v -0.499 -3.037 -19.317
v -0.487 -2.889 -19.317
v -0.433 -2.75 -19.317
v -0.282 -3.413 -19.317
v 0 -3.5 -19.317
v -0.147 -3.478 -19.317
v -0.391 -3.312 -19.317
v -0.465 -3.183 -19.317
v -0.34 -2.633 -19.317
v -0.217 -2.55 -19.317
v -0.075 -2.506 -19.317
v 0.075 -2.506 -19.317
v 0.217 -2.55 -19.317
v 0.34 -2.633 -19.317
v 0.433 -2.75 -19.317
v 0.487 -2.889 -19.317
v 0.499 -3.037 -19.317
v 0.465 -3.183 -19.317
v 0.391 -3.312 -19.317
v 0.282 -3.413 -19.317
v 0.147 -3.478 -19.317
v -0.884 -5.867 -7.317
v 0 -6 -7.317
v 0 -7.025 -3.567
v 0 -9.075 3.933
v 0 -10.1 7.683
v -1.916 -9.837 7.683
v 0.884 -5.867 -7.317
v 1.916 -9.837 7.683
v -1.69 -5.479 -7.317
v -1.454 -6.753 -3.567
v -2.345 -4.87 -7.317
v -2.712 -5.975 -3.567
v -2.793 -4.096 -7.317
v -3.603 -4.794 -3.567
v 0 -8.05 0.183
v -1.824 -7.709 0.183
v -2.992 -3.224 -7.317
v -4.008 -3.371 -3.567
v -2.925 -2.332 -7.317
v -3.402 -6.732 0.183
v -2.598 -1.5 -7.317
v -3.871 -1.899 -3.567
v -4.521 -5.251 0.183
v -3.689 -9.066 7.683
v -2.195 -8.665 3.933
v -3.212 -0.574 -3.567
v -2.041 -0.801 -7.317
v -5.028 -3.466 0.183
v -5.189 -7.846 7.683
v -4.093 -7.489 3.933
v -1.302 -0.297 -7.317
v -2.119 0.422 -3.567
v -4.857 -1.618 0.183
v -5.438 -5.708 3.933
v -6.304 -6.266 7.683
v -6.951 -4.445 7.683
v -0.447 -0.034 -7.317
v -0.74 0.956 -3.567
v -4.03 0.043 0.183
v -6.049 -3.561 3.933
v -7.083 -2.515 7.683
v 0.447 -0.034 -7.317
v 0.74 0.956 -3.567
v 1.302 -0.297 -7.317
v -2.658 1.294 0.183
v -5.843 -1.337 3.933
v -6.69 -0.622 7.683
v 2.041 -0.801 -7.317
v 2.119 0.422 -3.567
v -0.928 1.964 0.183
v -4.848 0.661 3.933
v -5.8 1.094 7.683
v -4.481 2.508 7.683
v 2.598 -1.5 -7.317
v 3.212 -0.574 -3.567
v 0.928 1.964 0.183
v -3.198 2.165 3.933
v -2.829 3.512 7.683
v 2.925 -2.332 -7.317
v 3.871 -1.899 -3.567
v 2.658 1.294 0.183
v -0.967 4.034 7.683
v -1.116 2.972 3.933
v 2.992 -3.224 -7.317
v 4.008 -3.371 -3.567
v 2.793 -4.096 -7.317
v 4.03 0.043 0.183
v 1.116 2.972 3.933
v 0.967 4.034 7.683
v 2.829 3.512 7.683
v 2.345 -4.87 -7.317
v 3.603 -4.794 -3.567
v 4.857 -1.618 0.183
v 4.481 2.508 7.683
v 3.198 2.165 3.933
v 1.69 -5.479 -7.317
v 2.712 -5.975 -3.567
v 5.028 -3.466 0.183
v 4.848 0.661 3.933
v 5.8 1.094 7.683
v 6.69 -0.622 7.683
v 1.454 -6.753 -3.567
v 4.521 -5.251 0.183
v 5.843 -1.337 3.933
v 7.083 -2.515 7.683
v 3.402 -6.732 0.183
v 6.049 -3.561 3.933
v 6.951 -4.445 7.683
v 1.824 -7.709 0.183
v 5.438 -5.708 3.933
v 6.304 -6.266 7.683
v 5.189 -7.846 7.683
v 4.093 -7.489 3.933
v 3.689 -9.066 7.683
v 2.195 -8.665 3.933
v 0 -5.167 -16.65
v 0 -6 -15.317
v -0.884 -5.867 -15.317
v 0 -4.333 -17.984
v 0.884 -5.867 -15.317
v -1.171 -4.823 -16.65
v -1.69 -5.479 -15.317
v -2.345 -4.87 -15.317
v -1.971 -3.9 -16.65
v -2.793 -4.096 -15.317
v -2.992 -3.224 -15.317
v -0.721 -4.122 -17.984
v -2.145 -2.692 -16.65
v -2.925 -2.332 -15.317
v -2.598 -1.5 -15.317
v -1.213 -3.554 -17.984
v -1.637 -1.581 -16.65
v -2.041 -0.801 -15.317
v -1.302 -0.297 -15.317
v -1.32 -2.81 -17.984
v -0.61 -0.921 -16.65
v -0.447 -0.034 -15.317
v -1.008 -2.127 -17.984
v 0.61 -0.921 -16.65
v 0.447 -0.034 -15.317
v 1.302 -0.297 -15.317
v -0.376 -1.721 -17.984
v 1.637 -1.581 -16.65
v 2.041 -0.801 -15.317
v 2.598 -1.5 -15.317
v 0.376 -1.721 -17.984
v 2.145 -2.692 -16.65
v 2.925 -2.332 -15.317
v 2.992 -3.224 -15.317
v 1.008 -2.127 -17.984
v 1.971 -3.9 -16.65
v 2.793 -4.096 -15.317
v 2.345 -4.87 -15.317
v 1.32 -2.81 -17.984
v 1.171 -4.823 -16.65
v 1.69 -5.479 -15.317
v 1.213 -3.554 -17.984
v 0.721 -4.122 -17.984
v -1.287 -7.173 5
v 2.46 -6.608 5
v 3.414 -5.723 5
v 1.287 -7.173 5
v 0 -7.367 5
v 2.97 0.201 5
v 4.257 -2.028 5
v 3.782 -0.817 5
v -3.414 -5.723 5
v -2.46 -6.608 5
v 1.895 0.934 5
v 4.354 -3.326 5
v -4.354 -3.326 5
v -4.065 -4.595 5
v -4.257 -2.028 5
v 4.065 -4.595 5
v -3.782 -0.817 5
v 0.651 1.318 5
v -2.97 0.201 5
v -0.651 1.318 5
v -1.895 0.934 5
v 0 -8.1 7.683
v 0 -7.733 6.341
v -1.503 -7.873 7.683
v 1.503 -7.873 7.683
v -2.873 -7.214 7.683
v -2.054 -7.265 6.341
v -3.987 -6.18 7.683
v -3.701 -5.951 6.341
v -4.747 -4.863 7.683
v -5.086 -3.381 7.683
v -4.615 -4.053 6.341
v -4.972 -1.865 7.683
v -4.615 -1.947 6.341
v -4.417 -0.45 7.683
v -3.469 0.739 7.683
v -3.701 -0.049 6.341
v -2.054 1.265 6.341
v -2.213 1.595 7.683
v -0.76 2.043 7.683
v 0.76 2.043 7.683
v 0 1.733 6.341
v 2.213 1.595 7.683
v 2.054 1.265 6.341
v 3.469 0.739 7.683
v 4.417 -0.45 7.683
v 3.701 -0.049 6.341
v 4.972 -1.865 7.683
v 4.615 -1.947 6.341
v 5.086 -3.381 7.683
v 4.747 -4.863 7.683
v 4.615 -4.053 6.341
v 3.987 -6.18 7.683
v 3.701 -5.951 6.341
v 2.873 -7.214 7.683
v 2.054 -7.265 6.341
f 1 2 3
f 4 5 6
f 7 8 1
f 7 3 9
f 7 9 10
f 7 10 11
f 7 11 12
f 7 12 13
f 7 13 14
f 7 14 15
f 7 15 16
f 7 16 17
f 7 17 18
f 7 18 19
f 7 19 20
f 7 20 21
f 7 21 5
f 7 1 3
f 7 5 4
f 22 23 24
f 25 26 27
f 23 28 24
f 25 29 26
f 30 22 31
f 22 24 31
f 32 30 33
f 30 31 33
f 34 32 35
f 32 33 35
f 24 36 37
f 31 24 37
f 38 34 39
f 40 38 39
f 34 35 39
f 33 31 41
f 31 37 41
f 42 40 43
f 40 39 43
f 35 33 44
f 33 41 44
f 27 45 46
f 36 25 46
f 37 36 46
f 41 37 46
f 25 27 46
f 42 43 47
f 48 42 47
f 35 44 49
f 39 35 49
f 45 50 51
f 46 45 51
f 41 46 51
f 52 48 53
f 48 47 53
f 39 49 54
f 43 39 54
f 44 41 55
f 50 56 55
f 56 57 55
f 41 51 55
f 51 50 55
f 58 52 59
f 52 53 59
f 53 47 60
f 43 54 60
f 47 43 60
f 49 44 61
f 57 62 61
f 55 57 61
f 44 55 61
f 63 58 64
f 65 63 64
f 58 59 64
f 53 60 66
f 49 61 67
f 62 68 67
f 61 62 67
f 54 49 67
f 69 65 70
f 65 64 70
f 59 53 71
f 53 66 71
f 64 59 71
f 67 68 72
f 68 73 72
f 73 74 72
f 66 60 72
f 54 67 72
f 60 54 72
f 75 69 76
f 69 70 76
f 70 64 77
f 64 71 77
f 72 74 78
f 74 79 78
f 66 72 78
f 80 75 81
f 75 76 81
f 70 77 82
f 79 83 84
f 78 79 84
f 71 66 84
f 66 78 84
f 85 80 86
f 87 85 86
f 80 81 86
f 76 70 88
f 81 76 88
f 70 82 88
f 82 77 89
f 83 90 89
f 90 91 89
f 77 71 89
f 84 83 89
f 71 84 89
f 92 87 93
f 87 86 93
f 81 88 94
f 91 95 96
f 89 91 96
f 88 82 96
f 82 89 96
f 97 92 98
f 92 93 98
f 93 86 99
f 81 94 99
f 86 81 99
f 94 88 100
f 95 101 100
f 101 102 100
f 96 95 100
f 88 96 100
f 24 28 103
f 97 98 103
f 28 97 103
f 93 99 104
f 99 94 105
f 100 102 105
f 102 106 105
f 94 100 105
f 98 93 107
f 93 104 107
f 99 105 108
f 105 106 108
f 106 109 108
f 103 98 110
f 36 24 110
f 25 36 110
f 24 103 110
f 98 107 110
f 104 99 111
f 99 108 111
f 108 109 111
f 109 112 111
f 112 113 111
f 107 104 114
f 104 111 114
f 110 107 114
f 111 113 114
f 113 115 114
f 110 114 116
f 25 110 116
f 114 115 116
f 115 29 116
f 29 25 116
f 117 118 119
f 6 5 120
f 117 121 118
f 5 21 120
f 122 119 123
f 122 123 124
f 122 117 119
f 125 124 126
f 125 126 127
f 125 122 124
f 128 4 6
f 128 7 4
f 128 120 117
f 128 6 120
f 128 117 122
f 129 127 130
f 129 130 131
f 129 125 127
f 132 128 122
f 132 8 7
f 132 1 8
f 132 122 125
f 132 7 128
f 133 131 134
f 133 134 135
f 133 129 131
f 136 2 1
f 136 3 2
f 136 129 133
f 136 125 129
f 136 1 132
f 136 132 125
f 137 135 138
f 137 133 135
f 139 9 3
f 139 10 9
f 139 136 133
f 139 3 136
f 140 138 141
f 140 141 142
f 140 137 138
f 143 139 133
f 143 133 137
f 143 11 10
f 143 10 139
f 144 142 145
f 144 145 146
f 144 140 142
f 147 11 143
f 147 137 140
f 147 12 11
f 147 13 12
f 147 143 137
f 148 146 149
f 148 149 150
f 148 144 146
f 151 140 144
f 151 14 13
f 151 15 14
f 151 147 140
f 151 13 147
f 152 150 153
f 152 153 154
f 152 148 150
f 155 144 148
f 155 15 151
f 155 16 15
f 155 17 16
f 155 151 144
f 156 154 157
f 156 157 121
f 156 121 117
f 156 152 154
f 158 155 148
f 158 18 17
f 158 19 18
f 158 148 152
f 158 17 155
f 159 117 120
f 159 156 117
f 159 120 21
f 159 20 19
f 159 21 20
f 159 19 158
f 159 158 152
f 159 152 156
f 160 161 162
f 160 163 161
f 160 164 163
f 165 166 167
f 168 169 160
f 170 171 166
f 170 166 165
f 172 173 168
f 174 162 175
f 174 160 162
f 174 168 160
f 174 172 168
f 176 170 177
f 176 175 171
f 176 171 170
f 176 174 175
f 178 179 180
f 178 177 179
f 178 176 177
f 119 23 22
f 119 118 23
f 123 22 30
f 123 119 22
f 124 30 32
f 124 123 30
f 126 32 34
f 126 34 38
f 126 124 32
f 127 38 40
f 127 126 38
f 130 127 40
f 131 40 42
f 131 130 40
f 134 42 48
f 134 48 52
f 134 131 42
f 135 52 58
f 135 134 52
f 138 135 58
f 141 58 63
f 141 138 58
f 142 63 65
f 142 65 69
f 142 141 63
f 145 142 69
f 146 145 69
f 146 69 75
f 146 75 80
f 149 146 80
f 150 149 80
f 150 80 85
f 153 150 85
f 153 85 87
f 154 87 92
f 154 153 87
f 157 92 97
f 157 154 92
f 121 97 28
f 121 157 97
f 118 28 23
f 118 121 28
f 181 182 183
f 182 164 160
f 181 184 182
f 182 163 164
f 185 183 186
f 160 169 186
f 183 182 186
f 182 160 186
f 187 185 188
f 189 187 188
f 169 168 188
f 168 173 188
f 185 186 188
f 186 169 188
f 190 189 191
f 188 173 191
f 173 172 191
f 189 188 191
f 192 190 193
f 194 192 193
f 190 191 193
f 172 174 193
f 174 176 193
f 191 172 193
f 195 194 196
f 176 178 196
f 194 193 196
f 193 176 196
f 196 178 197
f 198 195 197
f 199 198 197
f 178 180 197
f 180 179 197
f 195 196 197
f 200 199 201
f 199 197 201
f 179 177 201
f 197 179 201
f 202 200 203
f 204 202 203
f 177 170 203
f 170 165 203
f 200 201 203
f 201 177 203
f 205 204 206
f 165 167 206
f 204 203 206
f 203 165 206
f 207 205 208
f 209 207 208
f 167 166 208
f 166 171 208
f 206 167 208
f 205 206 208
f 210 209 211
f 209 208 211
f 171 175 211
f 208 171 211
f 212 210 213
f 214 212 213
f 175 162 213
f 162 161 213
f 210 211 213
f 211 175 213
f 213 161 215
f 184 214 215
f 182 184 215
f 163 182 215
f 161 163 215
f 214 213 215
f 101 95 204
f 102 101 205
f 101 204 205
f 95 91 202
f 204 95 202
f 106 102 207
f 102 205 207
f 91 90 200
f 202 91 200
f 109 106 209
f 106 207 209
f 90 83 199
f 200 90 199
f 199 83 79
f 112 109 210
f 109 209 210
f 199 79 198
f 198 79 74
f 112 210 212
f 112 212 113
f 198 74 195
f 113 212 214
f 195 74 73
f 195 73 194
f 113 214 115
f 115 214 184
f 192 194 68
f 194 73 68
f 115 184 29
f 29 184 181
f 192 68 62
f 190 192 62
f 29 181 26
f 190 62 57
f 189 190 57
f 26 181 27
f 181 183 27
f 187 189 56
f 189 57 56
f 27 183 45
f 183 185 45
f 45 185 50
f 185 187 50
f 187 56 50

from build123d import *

# Parameters (mm, degrees)
SKETCH2_W = 20.317073171
SKETCH2_H = 3


with BuildPart() as part:
    # Sketch2 → Revolve1 (revolve)
    with BuildSketch(Plane(origin=(0, 0, 0), x_dir=(0, 0, -1), z_dir=(1, 0, 0)), mode=Mode.PRIVATE) as revolve1_sk:
        with Locations((5.158536586, -1.5)):
            Rectangle(SKETCH2_W, SKETCH2_H)
        Polygon((-5, 1.366666667), (-5, 0), (0, 0), align=None)
        Polygon((-5, 1.366666667), (0, 0), (7.317073171, 0), (-7.682926829, 4.1), (-7.682926829, 2.1), align=None)
        Polygon((19.317073171, -3), (15.317073171, -3), (15.317073171, 0), (19.317073171, -2.5), align=None)
    revolve(revolve1_sk.sketch.rotate(Axis((0, -3, 5), (0, 0, -1)), 180), axis=Axis((0, -3, 5), (0, 0, -1)))


solid = part.part
